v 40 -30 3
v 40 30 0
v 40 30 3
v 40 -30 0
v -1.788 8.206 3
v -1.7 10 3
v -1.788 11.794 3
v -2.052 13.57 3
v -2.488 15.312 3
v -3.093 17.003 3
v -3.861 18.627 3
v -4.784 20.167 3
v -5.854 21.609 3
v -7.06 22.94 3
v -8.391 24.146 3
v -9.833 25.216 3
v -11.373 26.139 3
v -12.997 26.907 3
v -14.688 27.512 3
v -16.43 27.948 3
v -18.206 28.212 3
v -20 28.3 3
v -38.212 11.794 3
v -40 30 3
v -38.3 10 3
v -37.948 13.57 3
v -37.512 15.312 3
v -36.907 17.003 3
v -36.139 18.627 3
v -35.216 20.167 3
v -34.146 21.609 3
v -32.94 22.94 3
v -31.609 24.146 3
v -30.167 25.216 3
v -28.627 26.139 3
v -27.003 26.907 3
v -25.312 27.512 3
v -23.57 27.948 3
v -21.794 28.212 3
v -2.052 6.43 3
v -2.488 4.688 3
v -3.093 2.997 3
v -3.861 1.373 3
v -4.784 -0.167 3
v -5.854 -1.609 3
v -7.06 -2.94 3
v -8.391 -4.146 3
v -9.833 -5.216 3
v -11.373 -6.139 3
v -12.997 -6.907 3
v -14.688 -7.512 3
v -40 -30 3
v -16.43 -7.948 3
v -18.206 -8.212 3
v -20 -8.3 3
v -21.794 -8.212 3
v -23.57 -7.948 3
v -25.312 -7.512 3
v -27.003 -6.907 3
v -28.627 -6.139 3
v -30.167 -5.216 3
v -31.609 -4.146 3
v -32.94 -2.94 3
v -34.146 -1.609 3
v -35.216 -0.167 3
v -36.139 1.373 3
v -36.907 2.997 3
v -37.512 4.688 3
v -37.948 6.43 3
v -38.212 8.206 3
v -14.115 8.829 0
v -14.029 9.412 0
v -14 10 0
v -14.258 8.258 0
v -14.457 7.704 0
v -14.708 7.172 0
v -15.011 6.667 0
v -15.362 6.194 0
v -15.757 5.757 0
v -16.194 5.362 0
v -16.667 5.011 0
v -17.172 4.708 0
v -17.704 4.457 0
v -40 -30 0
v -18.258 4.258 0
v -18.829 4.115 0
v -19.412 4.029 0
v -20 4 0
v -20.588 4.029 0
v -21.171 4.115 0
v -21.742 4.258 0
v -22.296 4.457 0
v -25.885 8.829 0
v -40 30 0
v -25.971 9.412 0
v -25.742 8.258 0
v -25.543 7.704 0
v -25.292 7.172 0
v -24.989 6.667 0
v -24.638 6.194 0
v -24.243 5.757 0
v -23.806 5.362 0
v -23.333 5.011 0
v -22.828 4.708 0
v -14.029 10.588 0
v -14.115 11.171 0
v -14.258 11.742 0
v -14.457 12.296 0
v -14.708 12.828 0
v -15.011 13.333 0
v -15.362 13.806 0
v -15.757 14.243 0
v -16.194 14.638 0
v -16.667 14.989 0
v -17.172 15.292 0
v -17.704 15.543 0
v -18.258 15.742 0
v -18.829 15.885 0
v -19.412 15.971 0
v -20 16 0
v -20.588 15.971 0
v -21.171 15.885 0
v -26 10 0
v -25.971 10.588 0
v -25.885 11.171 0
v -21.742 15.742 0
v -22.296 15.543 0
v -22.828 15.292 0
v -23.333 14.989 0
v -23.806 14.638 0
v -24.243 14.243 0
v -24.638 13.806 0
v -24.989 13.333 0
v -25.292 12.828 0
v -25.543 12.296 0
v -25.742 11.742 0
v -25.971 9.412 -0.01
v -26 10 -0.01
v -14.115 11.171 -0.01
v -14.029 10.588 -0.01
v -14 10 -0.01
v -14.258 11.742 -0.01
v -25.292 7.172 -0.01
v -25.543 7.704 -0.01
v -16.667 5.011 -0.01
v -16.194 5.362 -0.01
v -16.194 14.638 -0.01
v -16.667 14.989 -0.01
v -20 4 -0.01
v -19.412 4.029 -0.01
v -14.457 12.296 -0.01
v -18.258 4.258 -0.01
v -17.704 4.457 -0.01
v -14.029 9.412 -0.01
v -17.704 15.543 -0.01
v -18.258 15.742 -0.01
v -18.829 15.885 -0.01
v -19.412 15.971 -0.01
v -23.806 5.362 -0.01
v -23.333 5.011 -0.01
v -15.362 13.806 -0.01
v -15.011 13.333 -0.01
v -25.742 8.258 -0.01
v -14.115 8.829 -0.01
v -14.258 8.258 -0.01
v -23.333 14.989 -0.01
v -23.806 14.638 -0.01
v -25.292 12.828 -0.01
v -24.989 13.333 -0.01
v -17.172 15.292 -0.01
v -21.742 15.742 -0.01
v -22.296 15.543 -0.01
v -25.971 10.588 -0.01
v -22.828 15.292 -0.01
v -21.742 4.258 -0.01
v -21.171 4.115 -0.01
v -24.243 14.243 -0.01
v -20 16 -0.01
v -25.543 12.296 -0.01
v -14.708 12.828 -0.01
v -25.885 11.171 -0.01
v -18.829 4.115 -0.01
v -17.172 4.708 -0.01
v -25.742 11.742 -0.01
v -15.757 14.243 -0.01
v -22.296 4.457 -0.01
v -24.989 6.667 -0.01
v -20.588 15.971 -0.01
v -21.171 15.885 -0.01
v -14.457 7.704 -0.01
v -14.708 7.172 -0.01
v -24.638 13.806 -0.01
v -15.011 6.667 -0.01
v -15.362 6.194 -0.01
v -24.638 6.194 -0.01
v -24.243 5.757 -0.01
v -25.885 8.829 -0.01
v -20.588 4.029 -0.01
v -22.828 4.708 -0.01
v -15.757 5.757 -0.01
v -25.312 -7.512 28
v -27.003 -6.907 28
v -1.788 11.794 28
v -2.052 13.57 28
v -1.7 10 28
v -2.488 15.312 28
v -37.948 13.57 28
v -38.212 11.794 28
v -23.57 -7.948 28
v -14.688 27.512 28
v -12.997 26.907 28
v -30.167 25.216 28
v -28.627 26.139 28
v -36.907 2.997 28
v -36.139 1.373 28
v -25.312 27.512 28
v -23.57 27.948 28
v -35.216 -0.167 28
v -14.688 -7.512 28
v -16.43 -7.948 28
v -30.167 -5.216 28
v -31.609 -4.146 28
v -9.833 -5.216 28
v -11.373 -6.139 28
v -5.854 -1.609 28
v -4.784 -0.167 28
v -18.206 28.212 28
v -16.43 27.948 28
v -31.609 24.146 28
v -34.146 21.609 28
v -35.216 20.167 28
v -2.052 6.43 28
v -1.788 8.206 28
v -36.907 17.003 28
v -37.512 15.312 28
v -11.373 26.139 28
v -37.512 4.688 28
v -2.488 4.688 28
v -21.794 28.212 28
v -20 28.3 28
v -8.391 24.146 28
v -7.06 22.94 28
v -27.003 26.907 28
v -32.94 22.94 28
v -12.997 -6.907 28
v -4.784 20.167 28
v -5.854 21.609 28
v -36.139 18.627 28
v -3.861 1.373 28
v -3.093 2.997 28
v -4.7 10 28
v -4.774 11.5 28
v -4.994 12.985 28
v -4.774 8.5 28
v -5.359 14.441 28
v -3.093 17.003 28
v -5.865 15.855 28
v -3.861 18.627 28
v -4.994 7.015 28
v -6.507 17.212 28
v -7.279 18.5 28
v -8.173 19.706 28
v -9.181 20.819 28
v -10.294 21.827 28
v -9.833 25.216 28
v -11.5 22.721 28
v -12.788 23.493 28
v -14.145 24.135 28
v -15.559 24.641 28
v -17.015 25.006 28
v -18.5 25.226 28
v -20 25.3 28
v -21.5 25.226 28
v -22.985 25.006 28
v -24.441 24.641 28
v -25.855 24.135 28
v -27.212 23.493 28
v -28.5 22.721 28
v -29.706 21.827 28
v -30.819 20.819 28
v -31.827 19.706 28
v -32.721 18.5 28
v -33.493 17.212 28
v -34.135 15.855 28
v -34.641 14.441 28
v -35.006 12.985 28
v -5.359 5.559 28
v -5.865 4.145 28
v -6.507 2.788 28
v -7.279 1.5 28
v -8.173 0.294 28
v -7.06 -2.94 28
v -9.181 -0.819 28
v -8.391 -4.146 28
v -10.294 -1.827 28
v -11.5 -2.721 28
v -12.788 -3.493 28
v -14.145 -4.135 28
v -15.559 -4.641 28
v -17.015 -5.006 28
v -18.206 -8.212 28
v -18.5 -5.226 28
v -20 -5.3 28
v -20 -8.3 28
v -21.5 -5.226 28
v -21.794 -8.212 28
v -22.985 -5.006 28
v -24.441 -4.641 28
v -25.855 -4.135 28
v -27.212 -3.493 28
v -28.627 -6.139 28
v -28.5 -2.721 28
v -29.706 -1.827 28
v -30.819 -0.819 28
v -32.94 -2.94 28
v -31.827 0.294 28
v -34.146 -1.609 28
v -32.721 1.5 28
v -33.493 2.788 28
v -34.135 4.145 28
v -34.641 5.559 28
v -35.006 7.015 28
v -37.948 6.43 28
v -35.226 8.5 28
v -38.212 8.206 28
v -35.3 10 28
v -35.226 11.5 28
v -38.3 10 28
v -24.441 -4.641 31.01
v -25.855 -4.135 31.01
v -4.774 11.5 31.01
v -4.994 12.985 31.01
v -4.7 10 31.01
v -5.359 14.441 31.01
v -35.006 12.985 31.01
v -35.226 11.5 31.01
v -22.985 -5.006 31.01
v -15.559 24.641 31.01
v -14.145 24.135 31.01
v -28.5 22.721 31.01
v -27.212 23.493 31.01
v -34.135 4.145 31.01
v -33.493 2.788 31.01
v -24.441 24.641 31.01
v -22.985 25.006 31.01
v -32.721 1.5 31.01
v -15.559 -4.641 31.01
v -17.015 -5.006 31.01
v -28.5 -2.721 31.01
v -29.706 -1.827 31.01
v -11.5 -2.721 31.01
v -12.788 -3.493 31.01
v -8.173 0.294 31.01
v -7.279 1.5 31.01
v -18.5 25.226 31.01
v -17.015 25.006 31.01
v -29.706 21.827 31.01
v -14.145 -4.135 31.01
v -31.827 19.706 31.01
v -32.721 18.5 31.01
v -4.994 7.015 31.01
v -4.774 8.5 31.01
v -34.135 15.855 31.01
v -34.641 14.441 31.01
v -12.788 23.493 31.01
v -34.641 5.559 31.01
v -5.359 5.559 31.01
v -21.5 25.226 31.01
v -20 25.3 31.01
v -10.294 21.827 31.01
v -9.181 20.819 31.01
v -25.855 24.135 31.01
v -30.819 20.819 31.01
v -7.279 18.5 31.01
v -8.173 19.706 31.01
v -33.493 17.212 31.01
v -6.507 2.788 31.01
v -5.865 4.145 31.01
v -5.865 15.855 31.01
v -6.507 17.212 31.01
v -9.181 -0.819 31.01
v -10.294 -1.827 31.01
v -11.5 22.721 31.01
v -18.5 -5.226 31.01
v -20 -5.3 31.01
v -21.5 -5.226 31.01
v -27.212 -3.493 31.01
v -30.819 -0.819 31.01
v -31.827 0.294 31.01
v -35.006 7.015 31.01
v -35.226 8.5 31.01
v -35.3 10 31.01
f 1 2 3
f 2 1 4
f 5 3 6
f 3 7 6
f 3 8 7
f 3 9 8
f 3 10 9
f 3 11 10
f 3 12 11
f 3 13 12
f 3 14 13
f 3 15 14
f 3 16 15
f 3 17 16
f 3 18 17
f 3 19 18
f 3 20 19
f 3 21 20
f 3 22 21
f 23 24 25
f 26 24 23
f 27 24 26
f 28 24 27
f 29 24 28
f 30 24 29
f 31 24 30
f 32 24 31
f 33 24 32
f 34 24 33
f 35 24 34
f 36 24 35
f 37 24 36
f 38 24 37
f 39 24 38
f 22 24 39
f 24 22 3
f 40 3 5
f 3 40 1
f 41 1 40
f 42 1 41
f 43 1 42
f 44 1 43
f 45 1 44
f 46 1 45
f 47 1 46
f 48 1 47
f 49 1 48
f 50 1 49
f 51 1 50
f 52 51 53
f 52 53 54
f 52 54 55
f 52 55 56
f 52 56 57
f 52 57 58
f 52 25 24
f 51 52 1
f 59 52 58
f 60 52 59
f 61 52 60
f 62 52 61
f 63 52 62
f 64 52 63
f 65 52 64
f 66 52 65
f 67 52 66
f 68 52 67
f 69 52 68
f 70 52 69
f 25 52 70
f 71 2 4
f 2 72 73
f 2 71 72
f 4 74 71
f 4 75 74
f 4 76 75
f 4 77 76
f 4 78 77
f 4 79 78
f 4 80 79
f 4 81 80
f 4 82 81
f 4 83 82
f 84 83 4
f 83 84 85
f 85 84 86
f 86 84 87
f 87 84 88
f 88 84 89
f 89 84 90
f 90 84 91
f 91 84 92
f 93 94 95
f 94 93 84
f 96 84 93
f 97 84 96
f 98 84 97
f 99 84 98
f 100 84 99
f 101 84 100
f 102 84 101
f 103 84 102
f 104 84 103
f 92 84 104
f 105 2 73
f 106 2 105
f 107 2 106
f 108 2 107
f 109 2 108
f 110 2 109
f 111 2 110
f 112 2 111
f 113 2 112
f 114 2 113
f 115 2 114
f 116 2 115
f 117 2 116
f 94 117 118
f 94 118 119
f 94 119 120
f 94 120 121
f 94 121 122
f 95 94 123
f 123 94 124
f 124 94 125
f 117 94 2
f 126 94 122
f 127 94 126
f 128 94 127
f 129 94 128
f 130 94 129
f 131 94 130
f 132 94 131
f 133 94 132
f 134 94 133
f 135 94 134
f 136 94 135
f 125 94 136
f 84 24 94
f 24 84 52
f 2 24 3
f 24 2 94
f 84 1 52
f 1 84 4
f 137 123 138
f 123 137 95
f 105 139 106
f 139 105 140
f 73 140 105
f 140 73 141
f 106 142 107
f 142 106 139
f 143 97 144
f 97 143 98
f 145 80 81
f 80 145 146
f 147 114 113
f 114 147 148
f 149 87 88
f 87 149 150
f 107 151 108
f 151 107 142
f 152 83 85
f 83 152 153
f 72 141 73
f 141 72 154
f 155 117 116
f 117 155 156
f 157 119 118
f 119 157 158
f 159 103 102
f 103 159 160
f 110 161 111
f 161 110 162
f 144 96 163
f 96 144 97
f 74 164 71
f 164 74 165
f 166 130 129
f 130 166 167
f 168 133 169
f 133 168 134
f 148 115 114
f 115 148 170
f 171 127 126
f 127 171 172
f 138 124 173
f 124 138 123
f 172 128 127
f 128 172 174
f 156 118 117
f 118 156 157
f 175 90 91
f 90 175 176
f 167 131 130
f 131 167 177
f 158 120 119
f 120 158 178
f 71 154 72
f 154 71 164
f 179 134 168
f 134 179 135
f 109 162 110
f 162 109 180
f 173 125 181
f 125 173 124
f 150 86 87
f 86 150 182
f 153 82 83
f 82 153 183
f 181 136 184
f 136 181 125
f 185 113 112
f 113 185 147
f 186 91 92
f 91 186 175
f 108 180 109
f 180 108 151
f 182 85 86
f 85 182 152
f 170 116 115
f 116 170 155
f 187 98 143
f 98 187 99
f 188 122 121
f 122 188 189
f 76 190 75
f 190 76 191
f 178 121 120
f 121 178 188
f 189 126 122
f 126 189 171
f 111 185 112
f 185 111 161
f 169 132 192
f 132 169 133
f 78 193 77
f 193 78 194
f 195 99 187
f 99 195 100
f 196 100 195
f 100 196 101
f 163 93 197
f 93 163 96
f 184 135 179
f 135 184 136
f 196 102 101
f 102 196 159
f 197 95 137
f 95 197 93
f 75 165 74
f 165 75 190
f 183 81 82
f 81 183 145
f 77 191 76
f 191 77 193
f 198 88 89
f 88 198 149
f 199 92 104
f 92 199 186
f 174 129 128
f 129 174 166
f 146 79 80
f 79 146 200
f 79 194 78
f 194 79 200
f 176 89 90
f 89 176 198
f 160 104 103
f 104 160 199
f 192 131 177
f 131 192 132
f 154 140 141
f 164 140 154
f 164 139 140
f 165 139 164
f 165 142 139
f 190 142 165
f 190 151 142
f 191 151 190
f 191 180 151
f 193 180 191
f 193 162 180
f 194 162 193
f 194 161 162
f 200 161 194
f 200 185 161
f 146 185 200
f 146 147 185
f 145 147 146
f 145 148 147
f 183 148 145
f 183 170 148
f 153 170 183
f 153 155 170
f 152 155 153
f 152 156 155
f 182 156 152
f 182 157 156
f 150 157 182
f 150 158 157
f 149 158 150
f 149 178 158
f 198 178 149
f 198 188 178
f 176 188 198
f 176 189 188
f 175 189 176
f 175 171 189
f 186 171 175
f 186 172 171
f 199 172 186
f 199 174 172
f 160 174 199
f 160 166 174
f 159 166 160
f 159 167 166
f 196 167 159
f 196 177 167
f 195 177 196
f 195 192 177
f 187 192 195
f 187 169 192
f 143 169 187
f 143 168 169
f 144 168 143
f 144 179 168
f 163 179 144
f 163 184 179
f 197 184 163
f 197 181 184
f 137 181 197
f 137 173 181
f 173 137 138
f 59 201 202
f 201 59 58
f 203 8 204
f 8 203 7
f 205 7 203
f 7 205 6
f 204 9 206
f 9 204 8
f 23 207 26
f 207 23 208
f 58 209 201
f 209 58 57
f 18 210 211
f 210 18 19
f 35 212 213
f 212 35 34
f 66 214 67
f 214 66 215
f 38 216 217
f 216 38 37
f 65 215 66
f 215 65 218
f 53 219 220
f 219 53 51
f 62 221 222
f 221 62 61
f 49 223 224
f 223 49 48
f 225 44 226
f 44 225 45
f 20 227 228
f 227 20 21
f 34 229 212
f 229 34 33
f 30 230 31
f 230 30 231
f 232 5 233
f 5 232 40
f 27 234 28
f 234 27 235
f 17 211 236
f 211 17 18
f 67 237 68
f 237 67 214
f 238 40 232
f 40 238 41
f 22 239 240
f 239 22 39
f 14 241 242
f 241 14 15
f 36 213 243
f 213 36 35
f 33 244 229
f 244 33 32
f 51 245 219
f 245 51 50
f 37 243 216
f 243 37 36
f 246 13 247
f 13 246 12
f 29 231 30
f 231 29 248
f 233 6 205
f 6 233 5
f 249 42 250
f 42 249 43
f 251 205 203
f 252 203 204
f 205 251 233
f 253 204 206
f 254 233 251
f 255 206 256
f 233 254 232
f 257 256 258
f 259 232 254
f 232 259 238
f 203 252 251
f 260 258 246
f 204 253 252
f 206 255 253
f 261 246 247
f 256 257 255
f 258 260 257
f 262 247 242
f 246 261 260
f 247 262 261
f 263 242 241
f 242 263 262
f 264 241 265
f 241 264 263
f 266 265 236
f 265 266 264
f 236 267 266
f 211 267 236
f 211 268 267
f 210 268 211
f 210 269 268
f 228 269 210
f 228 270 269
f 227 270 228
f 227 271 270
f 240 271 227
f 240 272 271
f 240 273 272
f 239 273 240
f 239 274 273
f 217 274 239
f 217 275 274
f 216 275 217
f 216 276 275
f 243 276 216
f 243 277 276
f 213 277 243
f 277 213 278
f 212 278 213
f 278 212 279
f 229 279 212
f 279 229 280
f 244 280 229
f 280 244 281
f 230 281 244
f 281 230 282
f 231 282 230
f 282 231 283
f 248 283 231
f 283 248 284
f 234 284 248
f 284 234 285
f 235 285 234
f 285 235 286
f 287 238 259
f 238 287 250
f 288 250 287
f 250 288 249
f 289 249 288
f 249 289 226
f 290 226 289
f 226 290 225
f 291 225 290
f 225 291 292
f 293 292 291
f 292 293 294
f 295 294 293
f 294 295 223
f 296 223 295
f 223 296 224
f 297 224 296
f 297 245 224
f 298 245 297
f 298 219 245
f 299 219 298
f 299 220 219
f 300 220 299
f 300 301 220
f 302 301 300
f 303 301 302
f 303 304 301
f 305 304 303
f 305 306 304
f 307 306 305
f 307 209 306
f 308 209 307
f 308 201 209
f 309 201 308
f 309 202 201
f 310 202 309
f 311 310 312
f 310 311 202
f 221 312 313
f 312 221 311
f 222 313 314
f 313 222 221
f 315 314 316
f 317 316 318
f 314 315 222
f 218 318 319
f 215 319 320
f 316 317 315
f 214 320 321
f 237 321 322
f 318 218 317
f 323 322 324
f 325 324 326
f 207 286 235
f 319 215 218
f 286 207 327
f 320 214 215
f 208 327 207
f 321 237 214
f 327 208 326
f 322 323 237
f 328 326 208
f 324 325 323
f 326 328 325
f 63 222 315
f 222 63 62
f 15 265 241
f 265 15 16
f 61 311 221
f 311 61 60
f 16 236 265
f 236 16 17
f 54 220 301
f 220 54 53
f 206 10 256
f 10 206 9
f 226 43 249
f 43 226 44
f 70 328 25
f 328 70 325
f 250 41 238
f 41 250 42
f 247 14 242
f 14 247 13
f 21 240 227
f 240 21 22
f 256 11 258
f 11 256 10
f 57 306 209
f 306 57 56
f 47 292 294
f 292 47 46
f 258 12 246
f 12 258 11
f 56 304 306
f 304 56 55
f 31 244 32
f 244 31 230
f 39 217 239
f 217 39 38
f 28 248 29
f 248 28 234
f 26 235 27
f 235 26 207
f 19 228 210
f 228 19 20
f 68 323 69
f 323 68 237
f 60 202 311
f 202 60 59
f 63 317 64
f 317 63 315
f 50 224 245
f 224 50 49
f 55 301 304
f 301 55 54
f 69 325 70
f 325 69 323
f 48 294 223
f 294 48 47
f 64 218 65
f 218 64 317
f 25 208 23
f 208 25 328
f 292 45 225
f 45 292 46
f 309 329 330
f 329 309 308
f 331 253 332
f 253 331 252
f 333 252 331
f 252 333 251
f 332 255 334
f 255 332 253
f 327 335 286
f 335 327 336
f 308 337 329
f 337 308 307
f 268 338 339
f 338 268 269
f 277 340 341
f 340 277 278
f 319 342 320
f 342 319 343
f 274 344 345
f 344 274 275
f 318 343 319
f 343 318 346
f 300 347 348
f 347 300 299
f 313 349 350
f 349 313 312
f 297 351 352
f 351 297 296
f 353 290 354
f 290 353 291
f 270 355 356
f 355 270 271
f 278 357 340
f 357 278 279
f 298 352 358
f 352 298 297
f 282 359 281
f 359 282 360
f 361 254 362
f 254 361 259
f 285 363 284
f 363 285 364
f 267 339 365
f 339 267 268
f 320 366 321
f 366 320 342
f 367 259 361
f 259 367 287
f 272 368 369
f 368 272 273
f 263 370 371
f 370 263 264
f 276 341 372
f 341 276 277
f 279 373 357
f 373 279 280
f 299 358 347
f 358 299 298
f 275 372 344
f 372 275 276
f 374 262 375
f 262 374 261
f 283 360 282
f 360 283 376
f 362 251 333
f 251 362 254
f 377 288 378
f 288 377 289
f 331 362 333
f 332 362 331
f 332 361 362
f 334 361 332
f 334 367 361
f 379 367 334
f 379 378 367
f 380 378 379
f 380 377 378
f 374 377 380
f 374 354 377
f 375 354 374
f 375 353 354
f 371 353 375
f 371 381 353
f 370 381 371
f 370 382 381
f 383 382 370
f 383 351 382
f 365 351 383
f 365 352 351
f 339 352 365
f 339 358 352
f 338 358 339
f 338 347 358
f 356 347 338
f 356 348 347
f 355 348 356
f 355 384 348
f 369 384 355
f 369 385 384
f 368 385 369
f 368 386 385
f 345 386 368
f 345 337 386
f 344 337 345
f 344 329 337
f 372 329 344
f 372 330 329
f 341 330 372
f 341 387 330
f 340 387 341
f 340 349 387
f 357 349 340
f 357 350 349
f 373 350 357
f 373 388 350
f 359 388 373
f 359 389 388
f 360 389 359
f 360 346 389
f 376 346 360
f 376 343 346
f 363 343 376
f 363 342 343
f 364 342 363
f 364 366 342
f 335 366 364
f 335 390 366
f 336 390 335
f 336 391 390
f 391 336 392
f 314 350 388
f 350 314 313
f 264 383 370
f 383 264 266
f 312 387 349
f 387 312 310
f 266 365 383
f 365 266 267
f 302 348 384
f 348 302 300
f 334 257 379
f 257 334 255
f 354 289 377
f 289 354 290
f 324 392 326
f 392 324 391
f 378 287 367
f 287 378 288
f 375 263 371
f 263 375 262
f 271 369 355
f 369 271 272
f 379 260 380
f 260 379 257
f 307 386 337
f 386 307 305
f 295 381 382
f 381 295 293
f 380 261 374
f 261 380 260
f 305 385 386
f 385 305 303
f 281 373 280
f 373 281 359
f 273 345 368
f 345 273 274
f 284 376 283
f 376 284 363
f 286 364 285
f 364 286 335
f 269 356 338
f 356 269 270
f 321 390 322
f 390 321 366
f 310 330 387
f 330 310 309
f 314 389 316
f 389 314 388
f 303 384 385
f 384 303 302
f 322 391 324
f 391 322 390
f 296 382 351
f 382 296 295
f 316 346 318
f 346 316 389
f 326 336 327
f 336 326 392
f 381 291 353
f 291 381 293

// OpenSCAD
// Dimensions (mm)
plate_x = 80;
plate_y = 60;
plate_z = 3;

cam_hole_d = 12;
cam_hole_x = -20;
cam_hole_y = 10;

sleeve_od = 36.6;
sleeve_z_start = 3;
sleeve_z_end = 31;

bore1_d = 22;
bore1_z_start = 3;
bore1_z_end = 11;

bore2_d = 30.6;
bore2_z_start = 11;
bore2_z_end = 31;

m3_hole_d = 2.5;
m3_z = 21;

$fn = 64;

// Plate
translate([-plate_x/2, -plate_y/2, 0])
  cube([plate_x, plate_y, plate_z]);

// Camera hole through plate
translate([cam_hole_x, cam_hole_y, -0.01])
  cylinder(h = plate_z + 0.02, r = cam_hole_d/2, $fn = $fn);

// Sleeve body
translate([cam_hole_x, cam_hole_y, 0])
  cylinder(h = sleeve_z_end - sleeve_z_start, r = sleeve_od/2, $fn = $fn);

// Bore 1 (stop)
translate([cam_hole_x, cam_hole_y, 0])
  cylinder(h = bore1_z_end - bore1_z_start + 0.01, r = bore1_d/2, $fn = $fn);

// Bore 2 (open top)
translate([cam_hole_x, cam_hole_y, bore2_z_start - 0.01])
  cylinder(h = bore2_z_end - bore2_z_start + 0.02, r = bore2_d/2, $fn = $fn);

// M3 centring screw holes
for (i = [0:2]) {
  angle = i * 120;
  // Radius to the middle of the sleeve wall
  wall_r = (sleeve_od/2 + bore2_d/2) / 2;
  hx = cam_hole_x + wall_r * cos(angle);
  hy = cam_hole_y + wall_r * sin(angle);
  translate([hx, hy, m3_z - 0.01])
    cylinder(h = 0.02, r = m3_hole_d/2, $fn = $fn);
}
